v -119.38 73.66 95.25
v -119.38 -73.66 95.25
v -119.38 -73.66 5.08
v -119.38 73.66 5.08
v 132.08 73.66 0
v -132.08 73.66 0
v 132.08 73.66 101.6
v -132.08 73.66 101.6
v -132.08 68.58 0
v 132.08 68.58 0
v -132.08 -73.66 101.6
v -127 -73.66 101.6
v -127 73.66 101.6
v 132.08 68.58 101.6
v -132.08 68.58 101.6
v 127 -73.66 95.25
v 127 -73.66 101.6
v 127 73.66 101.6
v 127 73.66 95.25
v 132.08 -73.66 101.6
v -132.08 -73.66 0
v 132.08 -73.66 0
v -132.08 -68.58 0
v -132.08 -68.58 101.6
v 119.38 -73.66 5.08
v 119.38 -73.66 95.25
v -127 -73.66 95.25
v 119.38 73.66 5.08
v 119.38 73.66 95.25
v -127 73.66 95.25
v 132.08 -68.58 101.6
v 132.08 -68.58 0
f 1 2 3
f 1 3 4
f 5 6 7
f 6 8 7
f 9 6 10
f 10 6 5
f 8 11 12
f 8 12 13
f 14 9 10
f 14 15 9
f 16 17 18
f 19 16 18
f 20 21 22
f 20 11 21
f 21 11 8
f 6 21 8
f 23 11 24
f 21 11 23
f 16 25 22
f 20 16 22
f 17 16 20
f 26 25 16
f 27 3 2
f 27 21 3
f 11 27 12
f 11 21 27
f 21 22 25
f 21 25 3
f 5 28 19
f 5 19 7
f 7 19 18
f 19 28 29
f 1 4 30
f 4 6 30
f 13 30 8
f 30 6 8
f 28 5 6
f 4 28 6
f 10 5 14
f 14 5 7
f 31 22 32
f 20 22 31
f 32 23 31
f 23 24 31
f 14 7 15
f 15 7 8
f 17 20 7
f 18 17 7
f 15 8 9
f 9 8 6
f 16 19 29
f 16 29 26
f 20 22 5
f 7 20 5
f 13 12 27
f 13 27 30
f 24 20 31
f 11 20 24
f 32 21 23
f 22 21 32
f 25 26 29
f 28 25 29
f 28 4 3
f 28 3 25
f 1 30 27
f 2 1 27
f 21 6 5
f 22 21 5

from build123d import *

# Parameters (mm, degrees)
F0_W      = 264.16
F0_H      = 147.32
F1_DEPTH  = 5.08
F4_DEPTH  = 12.7
F7_DEPTH  = 5.08
F10_W     = 147.32
F10_H     = 6.35
F11_DEPTH = 5.08


with BuildPart() as f1:
    # F0 (on Top) → F1 (new body)
    with BuildSketch(Plane.XY):
        Rectangle(F0_W, F0_H)
    extrude(amount=F1_DEPTH)

    # F3 (on offset) → F4 (join)
    with BuildSketch(Plane.YZ.offset(-132.08)):
        Polygon((-73.66, 0), (0, 0), (73.66, 0), (73.66, 95.25), (0, 95.25), (-73.66, 95.25), align=None)
    extrude(amount=F4_DEPTH)



with BuildPart() as f7:
    # F6 (on offset) → F7 (new body)
    with BuildSketch(Plane.XZ.offset(73.66)):
        Polygon((-132.08, 0), (0, 0), (132.08, 0), (132.08, 101.6), (-132.08, 101.6), align=None)
    extrude(amount=-F7_DEPTH)


with BuildPart() as f8_1:
    # F8: instance of F7
    add(f7.part.mirror(Plane.XZ))


with BuildPart() as f11:
    # F10 (on offset) → F11 (new body)
    with BuildSketch(Plane.YZ.offset(-132.08)):
        with Locations((0, 98.425)):
            Rectangle(F10_W, F10_H)
    extrude(amount=F11_DEPTH)


with BuildPart() as f1_1:
    add(f1.part)

    add(f11.part)  # F12 merges F11
    # F12: F11, F1 across plane
    add(f11.part.mirror(Plane.YZ))
    add(f1.part.mirror(Plane.YZ))


solid = Compound([f7.part, f8_1.part, f1_1.part])
